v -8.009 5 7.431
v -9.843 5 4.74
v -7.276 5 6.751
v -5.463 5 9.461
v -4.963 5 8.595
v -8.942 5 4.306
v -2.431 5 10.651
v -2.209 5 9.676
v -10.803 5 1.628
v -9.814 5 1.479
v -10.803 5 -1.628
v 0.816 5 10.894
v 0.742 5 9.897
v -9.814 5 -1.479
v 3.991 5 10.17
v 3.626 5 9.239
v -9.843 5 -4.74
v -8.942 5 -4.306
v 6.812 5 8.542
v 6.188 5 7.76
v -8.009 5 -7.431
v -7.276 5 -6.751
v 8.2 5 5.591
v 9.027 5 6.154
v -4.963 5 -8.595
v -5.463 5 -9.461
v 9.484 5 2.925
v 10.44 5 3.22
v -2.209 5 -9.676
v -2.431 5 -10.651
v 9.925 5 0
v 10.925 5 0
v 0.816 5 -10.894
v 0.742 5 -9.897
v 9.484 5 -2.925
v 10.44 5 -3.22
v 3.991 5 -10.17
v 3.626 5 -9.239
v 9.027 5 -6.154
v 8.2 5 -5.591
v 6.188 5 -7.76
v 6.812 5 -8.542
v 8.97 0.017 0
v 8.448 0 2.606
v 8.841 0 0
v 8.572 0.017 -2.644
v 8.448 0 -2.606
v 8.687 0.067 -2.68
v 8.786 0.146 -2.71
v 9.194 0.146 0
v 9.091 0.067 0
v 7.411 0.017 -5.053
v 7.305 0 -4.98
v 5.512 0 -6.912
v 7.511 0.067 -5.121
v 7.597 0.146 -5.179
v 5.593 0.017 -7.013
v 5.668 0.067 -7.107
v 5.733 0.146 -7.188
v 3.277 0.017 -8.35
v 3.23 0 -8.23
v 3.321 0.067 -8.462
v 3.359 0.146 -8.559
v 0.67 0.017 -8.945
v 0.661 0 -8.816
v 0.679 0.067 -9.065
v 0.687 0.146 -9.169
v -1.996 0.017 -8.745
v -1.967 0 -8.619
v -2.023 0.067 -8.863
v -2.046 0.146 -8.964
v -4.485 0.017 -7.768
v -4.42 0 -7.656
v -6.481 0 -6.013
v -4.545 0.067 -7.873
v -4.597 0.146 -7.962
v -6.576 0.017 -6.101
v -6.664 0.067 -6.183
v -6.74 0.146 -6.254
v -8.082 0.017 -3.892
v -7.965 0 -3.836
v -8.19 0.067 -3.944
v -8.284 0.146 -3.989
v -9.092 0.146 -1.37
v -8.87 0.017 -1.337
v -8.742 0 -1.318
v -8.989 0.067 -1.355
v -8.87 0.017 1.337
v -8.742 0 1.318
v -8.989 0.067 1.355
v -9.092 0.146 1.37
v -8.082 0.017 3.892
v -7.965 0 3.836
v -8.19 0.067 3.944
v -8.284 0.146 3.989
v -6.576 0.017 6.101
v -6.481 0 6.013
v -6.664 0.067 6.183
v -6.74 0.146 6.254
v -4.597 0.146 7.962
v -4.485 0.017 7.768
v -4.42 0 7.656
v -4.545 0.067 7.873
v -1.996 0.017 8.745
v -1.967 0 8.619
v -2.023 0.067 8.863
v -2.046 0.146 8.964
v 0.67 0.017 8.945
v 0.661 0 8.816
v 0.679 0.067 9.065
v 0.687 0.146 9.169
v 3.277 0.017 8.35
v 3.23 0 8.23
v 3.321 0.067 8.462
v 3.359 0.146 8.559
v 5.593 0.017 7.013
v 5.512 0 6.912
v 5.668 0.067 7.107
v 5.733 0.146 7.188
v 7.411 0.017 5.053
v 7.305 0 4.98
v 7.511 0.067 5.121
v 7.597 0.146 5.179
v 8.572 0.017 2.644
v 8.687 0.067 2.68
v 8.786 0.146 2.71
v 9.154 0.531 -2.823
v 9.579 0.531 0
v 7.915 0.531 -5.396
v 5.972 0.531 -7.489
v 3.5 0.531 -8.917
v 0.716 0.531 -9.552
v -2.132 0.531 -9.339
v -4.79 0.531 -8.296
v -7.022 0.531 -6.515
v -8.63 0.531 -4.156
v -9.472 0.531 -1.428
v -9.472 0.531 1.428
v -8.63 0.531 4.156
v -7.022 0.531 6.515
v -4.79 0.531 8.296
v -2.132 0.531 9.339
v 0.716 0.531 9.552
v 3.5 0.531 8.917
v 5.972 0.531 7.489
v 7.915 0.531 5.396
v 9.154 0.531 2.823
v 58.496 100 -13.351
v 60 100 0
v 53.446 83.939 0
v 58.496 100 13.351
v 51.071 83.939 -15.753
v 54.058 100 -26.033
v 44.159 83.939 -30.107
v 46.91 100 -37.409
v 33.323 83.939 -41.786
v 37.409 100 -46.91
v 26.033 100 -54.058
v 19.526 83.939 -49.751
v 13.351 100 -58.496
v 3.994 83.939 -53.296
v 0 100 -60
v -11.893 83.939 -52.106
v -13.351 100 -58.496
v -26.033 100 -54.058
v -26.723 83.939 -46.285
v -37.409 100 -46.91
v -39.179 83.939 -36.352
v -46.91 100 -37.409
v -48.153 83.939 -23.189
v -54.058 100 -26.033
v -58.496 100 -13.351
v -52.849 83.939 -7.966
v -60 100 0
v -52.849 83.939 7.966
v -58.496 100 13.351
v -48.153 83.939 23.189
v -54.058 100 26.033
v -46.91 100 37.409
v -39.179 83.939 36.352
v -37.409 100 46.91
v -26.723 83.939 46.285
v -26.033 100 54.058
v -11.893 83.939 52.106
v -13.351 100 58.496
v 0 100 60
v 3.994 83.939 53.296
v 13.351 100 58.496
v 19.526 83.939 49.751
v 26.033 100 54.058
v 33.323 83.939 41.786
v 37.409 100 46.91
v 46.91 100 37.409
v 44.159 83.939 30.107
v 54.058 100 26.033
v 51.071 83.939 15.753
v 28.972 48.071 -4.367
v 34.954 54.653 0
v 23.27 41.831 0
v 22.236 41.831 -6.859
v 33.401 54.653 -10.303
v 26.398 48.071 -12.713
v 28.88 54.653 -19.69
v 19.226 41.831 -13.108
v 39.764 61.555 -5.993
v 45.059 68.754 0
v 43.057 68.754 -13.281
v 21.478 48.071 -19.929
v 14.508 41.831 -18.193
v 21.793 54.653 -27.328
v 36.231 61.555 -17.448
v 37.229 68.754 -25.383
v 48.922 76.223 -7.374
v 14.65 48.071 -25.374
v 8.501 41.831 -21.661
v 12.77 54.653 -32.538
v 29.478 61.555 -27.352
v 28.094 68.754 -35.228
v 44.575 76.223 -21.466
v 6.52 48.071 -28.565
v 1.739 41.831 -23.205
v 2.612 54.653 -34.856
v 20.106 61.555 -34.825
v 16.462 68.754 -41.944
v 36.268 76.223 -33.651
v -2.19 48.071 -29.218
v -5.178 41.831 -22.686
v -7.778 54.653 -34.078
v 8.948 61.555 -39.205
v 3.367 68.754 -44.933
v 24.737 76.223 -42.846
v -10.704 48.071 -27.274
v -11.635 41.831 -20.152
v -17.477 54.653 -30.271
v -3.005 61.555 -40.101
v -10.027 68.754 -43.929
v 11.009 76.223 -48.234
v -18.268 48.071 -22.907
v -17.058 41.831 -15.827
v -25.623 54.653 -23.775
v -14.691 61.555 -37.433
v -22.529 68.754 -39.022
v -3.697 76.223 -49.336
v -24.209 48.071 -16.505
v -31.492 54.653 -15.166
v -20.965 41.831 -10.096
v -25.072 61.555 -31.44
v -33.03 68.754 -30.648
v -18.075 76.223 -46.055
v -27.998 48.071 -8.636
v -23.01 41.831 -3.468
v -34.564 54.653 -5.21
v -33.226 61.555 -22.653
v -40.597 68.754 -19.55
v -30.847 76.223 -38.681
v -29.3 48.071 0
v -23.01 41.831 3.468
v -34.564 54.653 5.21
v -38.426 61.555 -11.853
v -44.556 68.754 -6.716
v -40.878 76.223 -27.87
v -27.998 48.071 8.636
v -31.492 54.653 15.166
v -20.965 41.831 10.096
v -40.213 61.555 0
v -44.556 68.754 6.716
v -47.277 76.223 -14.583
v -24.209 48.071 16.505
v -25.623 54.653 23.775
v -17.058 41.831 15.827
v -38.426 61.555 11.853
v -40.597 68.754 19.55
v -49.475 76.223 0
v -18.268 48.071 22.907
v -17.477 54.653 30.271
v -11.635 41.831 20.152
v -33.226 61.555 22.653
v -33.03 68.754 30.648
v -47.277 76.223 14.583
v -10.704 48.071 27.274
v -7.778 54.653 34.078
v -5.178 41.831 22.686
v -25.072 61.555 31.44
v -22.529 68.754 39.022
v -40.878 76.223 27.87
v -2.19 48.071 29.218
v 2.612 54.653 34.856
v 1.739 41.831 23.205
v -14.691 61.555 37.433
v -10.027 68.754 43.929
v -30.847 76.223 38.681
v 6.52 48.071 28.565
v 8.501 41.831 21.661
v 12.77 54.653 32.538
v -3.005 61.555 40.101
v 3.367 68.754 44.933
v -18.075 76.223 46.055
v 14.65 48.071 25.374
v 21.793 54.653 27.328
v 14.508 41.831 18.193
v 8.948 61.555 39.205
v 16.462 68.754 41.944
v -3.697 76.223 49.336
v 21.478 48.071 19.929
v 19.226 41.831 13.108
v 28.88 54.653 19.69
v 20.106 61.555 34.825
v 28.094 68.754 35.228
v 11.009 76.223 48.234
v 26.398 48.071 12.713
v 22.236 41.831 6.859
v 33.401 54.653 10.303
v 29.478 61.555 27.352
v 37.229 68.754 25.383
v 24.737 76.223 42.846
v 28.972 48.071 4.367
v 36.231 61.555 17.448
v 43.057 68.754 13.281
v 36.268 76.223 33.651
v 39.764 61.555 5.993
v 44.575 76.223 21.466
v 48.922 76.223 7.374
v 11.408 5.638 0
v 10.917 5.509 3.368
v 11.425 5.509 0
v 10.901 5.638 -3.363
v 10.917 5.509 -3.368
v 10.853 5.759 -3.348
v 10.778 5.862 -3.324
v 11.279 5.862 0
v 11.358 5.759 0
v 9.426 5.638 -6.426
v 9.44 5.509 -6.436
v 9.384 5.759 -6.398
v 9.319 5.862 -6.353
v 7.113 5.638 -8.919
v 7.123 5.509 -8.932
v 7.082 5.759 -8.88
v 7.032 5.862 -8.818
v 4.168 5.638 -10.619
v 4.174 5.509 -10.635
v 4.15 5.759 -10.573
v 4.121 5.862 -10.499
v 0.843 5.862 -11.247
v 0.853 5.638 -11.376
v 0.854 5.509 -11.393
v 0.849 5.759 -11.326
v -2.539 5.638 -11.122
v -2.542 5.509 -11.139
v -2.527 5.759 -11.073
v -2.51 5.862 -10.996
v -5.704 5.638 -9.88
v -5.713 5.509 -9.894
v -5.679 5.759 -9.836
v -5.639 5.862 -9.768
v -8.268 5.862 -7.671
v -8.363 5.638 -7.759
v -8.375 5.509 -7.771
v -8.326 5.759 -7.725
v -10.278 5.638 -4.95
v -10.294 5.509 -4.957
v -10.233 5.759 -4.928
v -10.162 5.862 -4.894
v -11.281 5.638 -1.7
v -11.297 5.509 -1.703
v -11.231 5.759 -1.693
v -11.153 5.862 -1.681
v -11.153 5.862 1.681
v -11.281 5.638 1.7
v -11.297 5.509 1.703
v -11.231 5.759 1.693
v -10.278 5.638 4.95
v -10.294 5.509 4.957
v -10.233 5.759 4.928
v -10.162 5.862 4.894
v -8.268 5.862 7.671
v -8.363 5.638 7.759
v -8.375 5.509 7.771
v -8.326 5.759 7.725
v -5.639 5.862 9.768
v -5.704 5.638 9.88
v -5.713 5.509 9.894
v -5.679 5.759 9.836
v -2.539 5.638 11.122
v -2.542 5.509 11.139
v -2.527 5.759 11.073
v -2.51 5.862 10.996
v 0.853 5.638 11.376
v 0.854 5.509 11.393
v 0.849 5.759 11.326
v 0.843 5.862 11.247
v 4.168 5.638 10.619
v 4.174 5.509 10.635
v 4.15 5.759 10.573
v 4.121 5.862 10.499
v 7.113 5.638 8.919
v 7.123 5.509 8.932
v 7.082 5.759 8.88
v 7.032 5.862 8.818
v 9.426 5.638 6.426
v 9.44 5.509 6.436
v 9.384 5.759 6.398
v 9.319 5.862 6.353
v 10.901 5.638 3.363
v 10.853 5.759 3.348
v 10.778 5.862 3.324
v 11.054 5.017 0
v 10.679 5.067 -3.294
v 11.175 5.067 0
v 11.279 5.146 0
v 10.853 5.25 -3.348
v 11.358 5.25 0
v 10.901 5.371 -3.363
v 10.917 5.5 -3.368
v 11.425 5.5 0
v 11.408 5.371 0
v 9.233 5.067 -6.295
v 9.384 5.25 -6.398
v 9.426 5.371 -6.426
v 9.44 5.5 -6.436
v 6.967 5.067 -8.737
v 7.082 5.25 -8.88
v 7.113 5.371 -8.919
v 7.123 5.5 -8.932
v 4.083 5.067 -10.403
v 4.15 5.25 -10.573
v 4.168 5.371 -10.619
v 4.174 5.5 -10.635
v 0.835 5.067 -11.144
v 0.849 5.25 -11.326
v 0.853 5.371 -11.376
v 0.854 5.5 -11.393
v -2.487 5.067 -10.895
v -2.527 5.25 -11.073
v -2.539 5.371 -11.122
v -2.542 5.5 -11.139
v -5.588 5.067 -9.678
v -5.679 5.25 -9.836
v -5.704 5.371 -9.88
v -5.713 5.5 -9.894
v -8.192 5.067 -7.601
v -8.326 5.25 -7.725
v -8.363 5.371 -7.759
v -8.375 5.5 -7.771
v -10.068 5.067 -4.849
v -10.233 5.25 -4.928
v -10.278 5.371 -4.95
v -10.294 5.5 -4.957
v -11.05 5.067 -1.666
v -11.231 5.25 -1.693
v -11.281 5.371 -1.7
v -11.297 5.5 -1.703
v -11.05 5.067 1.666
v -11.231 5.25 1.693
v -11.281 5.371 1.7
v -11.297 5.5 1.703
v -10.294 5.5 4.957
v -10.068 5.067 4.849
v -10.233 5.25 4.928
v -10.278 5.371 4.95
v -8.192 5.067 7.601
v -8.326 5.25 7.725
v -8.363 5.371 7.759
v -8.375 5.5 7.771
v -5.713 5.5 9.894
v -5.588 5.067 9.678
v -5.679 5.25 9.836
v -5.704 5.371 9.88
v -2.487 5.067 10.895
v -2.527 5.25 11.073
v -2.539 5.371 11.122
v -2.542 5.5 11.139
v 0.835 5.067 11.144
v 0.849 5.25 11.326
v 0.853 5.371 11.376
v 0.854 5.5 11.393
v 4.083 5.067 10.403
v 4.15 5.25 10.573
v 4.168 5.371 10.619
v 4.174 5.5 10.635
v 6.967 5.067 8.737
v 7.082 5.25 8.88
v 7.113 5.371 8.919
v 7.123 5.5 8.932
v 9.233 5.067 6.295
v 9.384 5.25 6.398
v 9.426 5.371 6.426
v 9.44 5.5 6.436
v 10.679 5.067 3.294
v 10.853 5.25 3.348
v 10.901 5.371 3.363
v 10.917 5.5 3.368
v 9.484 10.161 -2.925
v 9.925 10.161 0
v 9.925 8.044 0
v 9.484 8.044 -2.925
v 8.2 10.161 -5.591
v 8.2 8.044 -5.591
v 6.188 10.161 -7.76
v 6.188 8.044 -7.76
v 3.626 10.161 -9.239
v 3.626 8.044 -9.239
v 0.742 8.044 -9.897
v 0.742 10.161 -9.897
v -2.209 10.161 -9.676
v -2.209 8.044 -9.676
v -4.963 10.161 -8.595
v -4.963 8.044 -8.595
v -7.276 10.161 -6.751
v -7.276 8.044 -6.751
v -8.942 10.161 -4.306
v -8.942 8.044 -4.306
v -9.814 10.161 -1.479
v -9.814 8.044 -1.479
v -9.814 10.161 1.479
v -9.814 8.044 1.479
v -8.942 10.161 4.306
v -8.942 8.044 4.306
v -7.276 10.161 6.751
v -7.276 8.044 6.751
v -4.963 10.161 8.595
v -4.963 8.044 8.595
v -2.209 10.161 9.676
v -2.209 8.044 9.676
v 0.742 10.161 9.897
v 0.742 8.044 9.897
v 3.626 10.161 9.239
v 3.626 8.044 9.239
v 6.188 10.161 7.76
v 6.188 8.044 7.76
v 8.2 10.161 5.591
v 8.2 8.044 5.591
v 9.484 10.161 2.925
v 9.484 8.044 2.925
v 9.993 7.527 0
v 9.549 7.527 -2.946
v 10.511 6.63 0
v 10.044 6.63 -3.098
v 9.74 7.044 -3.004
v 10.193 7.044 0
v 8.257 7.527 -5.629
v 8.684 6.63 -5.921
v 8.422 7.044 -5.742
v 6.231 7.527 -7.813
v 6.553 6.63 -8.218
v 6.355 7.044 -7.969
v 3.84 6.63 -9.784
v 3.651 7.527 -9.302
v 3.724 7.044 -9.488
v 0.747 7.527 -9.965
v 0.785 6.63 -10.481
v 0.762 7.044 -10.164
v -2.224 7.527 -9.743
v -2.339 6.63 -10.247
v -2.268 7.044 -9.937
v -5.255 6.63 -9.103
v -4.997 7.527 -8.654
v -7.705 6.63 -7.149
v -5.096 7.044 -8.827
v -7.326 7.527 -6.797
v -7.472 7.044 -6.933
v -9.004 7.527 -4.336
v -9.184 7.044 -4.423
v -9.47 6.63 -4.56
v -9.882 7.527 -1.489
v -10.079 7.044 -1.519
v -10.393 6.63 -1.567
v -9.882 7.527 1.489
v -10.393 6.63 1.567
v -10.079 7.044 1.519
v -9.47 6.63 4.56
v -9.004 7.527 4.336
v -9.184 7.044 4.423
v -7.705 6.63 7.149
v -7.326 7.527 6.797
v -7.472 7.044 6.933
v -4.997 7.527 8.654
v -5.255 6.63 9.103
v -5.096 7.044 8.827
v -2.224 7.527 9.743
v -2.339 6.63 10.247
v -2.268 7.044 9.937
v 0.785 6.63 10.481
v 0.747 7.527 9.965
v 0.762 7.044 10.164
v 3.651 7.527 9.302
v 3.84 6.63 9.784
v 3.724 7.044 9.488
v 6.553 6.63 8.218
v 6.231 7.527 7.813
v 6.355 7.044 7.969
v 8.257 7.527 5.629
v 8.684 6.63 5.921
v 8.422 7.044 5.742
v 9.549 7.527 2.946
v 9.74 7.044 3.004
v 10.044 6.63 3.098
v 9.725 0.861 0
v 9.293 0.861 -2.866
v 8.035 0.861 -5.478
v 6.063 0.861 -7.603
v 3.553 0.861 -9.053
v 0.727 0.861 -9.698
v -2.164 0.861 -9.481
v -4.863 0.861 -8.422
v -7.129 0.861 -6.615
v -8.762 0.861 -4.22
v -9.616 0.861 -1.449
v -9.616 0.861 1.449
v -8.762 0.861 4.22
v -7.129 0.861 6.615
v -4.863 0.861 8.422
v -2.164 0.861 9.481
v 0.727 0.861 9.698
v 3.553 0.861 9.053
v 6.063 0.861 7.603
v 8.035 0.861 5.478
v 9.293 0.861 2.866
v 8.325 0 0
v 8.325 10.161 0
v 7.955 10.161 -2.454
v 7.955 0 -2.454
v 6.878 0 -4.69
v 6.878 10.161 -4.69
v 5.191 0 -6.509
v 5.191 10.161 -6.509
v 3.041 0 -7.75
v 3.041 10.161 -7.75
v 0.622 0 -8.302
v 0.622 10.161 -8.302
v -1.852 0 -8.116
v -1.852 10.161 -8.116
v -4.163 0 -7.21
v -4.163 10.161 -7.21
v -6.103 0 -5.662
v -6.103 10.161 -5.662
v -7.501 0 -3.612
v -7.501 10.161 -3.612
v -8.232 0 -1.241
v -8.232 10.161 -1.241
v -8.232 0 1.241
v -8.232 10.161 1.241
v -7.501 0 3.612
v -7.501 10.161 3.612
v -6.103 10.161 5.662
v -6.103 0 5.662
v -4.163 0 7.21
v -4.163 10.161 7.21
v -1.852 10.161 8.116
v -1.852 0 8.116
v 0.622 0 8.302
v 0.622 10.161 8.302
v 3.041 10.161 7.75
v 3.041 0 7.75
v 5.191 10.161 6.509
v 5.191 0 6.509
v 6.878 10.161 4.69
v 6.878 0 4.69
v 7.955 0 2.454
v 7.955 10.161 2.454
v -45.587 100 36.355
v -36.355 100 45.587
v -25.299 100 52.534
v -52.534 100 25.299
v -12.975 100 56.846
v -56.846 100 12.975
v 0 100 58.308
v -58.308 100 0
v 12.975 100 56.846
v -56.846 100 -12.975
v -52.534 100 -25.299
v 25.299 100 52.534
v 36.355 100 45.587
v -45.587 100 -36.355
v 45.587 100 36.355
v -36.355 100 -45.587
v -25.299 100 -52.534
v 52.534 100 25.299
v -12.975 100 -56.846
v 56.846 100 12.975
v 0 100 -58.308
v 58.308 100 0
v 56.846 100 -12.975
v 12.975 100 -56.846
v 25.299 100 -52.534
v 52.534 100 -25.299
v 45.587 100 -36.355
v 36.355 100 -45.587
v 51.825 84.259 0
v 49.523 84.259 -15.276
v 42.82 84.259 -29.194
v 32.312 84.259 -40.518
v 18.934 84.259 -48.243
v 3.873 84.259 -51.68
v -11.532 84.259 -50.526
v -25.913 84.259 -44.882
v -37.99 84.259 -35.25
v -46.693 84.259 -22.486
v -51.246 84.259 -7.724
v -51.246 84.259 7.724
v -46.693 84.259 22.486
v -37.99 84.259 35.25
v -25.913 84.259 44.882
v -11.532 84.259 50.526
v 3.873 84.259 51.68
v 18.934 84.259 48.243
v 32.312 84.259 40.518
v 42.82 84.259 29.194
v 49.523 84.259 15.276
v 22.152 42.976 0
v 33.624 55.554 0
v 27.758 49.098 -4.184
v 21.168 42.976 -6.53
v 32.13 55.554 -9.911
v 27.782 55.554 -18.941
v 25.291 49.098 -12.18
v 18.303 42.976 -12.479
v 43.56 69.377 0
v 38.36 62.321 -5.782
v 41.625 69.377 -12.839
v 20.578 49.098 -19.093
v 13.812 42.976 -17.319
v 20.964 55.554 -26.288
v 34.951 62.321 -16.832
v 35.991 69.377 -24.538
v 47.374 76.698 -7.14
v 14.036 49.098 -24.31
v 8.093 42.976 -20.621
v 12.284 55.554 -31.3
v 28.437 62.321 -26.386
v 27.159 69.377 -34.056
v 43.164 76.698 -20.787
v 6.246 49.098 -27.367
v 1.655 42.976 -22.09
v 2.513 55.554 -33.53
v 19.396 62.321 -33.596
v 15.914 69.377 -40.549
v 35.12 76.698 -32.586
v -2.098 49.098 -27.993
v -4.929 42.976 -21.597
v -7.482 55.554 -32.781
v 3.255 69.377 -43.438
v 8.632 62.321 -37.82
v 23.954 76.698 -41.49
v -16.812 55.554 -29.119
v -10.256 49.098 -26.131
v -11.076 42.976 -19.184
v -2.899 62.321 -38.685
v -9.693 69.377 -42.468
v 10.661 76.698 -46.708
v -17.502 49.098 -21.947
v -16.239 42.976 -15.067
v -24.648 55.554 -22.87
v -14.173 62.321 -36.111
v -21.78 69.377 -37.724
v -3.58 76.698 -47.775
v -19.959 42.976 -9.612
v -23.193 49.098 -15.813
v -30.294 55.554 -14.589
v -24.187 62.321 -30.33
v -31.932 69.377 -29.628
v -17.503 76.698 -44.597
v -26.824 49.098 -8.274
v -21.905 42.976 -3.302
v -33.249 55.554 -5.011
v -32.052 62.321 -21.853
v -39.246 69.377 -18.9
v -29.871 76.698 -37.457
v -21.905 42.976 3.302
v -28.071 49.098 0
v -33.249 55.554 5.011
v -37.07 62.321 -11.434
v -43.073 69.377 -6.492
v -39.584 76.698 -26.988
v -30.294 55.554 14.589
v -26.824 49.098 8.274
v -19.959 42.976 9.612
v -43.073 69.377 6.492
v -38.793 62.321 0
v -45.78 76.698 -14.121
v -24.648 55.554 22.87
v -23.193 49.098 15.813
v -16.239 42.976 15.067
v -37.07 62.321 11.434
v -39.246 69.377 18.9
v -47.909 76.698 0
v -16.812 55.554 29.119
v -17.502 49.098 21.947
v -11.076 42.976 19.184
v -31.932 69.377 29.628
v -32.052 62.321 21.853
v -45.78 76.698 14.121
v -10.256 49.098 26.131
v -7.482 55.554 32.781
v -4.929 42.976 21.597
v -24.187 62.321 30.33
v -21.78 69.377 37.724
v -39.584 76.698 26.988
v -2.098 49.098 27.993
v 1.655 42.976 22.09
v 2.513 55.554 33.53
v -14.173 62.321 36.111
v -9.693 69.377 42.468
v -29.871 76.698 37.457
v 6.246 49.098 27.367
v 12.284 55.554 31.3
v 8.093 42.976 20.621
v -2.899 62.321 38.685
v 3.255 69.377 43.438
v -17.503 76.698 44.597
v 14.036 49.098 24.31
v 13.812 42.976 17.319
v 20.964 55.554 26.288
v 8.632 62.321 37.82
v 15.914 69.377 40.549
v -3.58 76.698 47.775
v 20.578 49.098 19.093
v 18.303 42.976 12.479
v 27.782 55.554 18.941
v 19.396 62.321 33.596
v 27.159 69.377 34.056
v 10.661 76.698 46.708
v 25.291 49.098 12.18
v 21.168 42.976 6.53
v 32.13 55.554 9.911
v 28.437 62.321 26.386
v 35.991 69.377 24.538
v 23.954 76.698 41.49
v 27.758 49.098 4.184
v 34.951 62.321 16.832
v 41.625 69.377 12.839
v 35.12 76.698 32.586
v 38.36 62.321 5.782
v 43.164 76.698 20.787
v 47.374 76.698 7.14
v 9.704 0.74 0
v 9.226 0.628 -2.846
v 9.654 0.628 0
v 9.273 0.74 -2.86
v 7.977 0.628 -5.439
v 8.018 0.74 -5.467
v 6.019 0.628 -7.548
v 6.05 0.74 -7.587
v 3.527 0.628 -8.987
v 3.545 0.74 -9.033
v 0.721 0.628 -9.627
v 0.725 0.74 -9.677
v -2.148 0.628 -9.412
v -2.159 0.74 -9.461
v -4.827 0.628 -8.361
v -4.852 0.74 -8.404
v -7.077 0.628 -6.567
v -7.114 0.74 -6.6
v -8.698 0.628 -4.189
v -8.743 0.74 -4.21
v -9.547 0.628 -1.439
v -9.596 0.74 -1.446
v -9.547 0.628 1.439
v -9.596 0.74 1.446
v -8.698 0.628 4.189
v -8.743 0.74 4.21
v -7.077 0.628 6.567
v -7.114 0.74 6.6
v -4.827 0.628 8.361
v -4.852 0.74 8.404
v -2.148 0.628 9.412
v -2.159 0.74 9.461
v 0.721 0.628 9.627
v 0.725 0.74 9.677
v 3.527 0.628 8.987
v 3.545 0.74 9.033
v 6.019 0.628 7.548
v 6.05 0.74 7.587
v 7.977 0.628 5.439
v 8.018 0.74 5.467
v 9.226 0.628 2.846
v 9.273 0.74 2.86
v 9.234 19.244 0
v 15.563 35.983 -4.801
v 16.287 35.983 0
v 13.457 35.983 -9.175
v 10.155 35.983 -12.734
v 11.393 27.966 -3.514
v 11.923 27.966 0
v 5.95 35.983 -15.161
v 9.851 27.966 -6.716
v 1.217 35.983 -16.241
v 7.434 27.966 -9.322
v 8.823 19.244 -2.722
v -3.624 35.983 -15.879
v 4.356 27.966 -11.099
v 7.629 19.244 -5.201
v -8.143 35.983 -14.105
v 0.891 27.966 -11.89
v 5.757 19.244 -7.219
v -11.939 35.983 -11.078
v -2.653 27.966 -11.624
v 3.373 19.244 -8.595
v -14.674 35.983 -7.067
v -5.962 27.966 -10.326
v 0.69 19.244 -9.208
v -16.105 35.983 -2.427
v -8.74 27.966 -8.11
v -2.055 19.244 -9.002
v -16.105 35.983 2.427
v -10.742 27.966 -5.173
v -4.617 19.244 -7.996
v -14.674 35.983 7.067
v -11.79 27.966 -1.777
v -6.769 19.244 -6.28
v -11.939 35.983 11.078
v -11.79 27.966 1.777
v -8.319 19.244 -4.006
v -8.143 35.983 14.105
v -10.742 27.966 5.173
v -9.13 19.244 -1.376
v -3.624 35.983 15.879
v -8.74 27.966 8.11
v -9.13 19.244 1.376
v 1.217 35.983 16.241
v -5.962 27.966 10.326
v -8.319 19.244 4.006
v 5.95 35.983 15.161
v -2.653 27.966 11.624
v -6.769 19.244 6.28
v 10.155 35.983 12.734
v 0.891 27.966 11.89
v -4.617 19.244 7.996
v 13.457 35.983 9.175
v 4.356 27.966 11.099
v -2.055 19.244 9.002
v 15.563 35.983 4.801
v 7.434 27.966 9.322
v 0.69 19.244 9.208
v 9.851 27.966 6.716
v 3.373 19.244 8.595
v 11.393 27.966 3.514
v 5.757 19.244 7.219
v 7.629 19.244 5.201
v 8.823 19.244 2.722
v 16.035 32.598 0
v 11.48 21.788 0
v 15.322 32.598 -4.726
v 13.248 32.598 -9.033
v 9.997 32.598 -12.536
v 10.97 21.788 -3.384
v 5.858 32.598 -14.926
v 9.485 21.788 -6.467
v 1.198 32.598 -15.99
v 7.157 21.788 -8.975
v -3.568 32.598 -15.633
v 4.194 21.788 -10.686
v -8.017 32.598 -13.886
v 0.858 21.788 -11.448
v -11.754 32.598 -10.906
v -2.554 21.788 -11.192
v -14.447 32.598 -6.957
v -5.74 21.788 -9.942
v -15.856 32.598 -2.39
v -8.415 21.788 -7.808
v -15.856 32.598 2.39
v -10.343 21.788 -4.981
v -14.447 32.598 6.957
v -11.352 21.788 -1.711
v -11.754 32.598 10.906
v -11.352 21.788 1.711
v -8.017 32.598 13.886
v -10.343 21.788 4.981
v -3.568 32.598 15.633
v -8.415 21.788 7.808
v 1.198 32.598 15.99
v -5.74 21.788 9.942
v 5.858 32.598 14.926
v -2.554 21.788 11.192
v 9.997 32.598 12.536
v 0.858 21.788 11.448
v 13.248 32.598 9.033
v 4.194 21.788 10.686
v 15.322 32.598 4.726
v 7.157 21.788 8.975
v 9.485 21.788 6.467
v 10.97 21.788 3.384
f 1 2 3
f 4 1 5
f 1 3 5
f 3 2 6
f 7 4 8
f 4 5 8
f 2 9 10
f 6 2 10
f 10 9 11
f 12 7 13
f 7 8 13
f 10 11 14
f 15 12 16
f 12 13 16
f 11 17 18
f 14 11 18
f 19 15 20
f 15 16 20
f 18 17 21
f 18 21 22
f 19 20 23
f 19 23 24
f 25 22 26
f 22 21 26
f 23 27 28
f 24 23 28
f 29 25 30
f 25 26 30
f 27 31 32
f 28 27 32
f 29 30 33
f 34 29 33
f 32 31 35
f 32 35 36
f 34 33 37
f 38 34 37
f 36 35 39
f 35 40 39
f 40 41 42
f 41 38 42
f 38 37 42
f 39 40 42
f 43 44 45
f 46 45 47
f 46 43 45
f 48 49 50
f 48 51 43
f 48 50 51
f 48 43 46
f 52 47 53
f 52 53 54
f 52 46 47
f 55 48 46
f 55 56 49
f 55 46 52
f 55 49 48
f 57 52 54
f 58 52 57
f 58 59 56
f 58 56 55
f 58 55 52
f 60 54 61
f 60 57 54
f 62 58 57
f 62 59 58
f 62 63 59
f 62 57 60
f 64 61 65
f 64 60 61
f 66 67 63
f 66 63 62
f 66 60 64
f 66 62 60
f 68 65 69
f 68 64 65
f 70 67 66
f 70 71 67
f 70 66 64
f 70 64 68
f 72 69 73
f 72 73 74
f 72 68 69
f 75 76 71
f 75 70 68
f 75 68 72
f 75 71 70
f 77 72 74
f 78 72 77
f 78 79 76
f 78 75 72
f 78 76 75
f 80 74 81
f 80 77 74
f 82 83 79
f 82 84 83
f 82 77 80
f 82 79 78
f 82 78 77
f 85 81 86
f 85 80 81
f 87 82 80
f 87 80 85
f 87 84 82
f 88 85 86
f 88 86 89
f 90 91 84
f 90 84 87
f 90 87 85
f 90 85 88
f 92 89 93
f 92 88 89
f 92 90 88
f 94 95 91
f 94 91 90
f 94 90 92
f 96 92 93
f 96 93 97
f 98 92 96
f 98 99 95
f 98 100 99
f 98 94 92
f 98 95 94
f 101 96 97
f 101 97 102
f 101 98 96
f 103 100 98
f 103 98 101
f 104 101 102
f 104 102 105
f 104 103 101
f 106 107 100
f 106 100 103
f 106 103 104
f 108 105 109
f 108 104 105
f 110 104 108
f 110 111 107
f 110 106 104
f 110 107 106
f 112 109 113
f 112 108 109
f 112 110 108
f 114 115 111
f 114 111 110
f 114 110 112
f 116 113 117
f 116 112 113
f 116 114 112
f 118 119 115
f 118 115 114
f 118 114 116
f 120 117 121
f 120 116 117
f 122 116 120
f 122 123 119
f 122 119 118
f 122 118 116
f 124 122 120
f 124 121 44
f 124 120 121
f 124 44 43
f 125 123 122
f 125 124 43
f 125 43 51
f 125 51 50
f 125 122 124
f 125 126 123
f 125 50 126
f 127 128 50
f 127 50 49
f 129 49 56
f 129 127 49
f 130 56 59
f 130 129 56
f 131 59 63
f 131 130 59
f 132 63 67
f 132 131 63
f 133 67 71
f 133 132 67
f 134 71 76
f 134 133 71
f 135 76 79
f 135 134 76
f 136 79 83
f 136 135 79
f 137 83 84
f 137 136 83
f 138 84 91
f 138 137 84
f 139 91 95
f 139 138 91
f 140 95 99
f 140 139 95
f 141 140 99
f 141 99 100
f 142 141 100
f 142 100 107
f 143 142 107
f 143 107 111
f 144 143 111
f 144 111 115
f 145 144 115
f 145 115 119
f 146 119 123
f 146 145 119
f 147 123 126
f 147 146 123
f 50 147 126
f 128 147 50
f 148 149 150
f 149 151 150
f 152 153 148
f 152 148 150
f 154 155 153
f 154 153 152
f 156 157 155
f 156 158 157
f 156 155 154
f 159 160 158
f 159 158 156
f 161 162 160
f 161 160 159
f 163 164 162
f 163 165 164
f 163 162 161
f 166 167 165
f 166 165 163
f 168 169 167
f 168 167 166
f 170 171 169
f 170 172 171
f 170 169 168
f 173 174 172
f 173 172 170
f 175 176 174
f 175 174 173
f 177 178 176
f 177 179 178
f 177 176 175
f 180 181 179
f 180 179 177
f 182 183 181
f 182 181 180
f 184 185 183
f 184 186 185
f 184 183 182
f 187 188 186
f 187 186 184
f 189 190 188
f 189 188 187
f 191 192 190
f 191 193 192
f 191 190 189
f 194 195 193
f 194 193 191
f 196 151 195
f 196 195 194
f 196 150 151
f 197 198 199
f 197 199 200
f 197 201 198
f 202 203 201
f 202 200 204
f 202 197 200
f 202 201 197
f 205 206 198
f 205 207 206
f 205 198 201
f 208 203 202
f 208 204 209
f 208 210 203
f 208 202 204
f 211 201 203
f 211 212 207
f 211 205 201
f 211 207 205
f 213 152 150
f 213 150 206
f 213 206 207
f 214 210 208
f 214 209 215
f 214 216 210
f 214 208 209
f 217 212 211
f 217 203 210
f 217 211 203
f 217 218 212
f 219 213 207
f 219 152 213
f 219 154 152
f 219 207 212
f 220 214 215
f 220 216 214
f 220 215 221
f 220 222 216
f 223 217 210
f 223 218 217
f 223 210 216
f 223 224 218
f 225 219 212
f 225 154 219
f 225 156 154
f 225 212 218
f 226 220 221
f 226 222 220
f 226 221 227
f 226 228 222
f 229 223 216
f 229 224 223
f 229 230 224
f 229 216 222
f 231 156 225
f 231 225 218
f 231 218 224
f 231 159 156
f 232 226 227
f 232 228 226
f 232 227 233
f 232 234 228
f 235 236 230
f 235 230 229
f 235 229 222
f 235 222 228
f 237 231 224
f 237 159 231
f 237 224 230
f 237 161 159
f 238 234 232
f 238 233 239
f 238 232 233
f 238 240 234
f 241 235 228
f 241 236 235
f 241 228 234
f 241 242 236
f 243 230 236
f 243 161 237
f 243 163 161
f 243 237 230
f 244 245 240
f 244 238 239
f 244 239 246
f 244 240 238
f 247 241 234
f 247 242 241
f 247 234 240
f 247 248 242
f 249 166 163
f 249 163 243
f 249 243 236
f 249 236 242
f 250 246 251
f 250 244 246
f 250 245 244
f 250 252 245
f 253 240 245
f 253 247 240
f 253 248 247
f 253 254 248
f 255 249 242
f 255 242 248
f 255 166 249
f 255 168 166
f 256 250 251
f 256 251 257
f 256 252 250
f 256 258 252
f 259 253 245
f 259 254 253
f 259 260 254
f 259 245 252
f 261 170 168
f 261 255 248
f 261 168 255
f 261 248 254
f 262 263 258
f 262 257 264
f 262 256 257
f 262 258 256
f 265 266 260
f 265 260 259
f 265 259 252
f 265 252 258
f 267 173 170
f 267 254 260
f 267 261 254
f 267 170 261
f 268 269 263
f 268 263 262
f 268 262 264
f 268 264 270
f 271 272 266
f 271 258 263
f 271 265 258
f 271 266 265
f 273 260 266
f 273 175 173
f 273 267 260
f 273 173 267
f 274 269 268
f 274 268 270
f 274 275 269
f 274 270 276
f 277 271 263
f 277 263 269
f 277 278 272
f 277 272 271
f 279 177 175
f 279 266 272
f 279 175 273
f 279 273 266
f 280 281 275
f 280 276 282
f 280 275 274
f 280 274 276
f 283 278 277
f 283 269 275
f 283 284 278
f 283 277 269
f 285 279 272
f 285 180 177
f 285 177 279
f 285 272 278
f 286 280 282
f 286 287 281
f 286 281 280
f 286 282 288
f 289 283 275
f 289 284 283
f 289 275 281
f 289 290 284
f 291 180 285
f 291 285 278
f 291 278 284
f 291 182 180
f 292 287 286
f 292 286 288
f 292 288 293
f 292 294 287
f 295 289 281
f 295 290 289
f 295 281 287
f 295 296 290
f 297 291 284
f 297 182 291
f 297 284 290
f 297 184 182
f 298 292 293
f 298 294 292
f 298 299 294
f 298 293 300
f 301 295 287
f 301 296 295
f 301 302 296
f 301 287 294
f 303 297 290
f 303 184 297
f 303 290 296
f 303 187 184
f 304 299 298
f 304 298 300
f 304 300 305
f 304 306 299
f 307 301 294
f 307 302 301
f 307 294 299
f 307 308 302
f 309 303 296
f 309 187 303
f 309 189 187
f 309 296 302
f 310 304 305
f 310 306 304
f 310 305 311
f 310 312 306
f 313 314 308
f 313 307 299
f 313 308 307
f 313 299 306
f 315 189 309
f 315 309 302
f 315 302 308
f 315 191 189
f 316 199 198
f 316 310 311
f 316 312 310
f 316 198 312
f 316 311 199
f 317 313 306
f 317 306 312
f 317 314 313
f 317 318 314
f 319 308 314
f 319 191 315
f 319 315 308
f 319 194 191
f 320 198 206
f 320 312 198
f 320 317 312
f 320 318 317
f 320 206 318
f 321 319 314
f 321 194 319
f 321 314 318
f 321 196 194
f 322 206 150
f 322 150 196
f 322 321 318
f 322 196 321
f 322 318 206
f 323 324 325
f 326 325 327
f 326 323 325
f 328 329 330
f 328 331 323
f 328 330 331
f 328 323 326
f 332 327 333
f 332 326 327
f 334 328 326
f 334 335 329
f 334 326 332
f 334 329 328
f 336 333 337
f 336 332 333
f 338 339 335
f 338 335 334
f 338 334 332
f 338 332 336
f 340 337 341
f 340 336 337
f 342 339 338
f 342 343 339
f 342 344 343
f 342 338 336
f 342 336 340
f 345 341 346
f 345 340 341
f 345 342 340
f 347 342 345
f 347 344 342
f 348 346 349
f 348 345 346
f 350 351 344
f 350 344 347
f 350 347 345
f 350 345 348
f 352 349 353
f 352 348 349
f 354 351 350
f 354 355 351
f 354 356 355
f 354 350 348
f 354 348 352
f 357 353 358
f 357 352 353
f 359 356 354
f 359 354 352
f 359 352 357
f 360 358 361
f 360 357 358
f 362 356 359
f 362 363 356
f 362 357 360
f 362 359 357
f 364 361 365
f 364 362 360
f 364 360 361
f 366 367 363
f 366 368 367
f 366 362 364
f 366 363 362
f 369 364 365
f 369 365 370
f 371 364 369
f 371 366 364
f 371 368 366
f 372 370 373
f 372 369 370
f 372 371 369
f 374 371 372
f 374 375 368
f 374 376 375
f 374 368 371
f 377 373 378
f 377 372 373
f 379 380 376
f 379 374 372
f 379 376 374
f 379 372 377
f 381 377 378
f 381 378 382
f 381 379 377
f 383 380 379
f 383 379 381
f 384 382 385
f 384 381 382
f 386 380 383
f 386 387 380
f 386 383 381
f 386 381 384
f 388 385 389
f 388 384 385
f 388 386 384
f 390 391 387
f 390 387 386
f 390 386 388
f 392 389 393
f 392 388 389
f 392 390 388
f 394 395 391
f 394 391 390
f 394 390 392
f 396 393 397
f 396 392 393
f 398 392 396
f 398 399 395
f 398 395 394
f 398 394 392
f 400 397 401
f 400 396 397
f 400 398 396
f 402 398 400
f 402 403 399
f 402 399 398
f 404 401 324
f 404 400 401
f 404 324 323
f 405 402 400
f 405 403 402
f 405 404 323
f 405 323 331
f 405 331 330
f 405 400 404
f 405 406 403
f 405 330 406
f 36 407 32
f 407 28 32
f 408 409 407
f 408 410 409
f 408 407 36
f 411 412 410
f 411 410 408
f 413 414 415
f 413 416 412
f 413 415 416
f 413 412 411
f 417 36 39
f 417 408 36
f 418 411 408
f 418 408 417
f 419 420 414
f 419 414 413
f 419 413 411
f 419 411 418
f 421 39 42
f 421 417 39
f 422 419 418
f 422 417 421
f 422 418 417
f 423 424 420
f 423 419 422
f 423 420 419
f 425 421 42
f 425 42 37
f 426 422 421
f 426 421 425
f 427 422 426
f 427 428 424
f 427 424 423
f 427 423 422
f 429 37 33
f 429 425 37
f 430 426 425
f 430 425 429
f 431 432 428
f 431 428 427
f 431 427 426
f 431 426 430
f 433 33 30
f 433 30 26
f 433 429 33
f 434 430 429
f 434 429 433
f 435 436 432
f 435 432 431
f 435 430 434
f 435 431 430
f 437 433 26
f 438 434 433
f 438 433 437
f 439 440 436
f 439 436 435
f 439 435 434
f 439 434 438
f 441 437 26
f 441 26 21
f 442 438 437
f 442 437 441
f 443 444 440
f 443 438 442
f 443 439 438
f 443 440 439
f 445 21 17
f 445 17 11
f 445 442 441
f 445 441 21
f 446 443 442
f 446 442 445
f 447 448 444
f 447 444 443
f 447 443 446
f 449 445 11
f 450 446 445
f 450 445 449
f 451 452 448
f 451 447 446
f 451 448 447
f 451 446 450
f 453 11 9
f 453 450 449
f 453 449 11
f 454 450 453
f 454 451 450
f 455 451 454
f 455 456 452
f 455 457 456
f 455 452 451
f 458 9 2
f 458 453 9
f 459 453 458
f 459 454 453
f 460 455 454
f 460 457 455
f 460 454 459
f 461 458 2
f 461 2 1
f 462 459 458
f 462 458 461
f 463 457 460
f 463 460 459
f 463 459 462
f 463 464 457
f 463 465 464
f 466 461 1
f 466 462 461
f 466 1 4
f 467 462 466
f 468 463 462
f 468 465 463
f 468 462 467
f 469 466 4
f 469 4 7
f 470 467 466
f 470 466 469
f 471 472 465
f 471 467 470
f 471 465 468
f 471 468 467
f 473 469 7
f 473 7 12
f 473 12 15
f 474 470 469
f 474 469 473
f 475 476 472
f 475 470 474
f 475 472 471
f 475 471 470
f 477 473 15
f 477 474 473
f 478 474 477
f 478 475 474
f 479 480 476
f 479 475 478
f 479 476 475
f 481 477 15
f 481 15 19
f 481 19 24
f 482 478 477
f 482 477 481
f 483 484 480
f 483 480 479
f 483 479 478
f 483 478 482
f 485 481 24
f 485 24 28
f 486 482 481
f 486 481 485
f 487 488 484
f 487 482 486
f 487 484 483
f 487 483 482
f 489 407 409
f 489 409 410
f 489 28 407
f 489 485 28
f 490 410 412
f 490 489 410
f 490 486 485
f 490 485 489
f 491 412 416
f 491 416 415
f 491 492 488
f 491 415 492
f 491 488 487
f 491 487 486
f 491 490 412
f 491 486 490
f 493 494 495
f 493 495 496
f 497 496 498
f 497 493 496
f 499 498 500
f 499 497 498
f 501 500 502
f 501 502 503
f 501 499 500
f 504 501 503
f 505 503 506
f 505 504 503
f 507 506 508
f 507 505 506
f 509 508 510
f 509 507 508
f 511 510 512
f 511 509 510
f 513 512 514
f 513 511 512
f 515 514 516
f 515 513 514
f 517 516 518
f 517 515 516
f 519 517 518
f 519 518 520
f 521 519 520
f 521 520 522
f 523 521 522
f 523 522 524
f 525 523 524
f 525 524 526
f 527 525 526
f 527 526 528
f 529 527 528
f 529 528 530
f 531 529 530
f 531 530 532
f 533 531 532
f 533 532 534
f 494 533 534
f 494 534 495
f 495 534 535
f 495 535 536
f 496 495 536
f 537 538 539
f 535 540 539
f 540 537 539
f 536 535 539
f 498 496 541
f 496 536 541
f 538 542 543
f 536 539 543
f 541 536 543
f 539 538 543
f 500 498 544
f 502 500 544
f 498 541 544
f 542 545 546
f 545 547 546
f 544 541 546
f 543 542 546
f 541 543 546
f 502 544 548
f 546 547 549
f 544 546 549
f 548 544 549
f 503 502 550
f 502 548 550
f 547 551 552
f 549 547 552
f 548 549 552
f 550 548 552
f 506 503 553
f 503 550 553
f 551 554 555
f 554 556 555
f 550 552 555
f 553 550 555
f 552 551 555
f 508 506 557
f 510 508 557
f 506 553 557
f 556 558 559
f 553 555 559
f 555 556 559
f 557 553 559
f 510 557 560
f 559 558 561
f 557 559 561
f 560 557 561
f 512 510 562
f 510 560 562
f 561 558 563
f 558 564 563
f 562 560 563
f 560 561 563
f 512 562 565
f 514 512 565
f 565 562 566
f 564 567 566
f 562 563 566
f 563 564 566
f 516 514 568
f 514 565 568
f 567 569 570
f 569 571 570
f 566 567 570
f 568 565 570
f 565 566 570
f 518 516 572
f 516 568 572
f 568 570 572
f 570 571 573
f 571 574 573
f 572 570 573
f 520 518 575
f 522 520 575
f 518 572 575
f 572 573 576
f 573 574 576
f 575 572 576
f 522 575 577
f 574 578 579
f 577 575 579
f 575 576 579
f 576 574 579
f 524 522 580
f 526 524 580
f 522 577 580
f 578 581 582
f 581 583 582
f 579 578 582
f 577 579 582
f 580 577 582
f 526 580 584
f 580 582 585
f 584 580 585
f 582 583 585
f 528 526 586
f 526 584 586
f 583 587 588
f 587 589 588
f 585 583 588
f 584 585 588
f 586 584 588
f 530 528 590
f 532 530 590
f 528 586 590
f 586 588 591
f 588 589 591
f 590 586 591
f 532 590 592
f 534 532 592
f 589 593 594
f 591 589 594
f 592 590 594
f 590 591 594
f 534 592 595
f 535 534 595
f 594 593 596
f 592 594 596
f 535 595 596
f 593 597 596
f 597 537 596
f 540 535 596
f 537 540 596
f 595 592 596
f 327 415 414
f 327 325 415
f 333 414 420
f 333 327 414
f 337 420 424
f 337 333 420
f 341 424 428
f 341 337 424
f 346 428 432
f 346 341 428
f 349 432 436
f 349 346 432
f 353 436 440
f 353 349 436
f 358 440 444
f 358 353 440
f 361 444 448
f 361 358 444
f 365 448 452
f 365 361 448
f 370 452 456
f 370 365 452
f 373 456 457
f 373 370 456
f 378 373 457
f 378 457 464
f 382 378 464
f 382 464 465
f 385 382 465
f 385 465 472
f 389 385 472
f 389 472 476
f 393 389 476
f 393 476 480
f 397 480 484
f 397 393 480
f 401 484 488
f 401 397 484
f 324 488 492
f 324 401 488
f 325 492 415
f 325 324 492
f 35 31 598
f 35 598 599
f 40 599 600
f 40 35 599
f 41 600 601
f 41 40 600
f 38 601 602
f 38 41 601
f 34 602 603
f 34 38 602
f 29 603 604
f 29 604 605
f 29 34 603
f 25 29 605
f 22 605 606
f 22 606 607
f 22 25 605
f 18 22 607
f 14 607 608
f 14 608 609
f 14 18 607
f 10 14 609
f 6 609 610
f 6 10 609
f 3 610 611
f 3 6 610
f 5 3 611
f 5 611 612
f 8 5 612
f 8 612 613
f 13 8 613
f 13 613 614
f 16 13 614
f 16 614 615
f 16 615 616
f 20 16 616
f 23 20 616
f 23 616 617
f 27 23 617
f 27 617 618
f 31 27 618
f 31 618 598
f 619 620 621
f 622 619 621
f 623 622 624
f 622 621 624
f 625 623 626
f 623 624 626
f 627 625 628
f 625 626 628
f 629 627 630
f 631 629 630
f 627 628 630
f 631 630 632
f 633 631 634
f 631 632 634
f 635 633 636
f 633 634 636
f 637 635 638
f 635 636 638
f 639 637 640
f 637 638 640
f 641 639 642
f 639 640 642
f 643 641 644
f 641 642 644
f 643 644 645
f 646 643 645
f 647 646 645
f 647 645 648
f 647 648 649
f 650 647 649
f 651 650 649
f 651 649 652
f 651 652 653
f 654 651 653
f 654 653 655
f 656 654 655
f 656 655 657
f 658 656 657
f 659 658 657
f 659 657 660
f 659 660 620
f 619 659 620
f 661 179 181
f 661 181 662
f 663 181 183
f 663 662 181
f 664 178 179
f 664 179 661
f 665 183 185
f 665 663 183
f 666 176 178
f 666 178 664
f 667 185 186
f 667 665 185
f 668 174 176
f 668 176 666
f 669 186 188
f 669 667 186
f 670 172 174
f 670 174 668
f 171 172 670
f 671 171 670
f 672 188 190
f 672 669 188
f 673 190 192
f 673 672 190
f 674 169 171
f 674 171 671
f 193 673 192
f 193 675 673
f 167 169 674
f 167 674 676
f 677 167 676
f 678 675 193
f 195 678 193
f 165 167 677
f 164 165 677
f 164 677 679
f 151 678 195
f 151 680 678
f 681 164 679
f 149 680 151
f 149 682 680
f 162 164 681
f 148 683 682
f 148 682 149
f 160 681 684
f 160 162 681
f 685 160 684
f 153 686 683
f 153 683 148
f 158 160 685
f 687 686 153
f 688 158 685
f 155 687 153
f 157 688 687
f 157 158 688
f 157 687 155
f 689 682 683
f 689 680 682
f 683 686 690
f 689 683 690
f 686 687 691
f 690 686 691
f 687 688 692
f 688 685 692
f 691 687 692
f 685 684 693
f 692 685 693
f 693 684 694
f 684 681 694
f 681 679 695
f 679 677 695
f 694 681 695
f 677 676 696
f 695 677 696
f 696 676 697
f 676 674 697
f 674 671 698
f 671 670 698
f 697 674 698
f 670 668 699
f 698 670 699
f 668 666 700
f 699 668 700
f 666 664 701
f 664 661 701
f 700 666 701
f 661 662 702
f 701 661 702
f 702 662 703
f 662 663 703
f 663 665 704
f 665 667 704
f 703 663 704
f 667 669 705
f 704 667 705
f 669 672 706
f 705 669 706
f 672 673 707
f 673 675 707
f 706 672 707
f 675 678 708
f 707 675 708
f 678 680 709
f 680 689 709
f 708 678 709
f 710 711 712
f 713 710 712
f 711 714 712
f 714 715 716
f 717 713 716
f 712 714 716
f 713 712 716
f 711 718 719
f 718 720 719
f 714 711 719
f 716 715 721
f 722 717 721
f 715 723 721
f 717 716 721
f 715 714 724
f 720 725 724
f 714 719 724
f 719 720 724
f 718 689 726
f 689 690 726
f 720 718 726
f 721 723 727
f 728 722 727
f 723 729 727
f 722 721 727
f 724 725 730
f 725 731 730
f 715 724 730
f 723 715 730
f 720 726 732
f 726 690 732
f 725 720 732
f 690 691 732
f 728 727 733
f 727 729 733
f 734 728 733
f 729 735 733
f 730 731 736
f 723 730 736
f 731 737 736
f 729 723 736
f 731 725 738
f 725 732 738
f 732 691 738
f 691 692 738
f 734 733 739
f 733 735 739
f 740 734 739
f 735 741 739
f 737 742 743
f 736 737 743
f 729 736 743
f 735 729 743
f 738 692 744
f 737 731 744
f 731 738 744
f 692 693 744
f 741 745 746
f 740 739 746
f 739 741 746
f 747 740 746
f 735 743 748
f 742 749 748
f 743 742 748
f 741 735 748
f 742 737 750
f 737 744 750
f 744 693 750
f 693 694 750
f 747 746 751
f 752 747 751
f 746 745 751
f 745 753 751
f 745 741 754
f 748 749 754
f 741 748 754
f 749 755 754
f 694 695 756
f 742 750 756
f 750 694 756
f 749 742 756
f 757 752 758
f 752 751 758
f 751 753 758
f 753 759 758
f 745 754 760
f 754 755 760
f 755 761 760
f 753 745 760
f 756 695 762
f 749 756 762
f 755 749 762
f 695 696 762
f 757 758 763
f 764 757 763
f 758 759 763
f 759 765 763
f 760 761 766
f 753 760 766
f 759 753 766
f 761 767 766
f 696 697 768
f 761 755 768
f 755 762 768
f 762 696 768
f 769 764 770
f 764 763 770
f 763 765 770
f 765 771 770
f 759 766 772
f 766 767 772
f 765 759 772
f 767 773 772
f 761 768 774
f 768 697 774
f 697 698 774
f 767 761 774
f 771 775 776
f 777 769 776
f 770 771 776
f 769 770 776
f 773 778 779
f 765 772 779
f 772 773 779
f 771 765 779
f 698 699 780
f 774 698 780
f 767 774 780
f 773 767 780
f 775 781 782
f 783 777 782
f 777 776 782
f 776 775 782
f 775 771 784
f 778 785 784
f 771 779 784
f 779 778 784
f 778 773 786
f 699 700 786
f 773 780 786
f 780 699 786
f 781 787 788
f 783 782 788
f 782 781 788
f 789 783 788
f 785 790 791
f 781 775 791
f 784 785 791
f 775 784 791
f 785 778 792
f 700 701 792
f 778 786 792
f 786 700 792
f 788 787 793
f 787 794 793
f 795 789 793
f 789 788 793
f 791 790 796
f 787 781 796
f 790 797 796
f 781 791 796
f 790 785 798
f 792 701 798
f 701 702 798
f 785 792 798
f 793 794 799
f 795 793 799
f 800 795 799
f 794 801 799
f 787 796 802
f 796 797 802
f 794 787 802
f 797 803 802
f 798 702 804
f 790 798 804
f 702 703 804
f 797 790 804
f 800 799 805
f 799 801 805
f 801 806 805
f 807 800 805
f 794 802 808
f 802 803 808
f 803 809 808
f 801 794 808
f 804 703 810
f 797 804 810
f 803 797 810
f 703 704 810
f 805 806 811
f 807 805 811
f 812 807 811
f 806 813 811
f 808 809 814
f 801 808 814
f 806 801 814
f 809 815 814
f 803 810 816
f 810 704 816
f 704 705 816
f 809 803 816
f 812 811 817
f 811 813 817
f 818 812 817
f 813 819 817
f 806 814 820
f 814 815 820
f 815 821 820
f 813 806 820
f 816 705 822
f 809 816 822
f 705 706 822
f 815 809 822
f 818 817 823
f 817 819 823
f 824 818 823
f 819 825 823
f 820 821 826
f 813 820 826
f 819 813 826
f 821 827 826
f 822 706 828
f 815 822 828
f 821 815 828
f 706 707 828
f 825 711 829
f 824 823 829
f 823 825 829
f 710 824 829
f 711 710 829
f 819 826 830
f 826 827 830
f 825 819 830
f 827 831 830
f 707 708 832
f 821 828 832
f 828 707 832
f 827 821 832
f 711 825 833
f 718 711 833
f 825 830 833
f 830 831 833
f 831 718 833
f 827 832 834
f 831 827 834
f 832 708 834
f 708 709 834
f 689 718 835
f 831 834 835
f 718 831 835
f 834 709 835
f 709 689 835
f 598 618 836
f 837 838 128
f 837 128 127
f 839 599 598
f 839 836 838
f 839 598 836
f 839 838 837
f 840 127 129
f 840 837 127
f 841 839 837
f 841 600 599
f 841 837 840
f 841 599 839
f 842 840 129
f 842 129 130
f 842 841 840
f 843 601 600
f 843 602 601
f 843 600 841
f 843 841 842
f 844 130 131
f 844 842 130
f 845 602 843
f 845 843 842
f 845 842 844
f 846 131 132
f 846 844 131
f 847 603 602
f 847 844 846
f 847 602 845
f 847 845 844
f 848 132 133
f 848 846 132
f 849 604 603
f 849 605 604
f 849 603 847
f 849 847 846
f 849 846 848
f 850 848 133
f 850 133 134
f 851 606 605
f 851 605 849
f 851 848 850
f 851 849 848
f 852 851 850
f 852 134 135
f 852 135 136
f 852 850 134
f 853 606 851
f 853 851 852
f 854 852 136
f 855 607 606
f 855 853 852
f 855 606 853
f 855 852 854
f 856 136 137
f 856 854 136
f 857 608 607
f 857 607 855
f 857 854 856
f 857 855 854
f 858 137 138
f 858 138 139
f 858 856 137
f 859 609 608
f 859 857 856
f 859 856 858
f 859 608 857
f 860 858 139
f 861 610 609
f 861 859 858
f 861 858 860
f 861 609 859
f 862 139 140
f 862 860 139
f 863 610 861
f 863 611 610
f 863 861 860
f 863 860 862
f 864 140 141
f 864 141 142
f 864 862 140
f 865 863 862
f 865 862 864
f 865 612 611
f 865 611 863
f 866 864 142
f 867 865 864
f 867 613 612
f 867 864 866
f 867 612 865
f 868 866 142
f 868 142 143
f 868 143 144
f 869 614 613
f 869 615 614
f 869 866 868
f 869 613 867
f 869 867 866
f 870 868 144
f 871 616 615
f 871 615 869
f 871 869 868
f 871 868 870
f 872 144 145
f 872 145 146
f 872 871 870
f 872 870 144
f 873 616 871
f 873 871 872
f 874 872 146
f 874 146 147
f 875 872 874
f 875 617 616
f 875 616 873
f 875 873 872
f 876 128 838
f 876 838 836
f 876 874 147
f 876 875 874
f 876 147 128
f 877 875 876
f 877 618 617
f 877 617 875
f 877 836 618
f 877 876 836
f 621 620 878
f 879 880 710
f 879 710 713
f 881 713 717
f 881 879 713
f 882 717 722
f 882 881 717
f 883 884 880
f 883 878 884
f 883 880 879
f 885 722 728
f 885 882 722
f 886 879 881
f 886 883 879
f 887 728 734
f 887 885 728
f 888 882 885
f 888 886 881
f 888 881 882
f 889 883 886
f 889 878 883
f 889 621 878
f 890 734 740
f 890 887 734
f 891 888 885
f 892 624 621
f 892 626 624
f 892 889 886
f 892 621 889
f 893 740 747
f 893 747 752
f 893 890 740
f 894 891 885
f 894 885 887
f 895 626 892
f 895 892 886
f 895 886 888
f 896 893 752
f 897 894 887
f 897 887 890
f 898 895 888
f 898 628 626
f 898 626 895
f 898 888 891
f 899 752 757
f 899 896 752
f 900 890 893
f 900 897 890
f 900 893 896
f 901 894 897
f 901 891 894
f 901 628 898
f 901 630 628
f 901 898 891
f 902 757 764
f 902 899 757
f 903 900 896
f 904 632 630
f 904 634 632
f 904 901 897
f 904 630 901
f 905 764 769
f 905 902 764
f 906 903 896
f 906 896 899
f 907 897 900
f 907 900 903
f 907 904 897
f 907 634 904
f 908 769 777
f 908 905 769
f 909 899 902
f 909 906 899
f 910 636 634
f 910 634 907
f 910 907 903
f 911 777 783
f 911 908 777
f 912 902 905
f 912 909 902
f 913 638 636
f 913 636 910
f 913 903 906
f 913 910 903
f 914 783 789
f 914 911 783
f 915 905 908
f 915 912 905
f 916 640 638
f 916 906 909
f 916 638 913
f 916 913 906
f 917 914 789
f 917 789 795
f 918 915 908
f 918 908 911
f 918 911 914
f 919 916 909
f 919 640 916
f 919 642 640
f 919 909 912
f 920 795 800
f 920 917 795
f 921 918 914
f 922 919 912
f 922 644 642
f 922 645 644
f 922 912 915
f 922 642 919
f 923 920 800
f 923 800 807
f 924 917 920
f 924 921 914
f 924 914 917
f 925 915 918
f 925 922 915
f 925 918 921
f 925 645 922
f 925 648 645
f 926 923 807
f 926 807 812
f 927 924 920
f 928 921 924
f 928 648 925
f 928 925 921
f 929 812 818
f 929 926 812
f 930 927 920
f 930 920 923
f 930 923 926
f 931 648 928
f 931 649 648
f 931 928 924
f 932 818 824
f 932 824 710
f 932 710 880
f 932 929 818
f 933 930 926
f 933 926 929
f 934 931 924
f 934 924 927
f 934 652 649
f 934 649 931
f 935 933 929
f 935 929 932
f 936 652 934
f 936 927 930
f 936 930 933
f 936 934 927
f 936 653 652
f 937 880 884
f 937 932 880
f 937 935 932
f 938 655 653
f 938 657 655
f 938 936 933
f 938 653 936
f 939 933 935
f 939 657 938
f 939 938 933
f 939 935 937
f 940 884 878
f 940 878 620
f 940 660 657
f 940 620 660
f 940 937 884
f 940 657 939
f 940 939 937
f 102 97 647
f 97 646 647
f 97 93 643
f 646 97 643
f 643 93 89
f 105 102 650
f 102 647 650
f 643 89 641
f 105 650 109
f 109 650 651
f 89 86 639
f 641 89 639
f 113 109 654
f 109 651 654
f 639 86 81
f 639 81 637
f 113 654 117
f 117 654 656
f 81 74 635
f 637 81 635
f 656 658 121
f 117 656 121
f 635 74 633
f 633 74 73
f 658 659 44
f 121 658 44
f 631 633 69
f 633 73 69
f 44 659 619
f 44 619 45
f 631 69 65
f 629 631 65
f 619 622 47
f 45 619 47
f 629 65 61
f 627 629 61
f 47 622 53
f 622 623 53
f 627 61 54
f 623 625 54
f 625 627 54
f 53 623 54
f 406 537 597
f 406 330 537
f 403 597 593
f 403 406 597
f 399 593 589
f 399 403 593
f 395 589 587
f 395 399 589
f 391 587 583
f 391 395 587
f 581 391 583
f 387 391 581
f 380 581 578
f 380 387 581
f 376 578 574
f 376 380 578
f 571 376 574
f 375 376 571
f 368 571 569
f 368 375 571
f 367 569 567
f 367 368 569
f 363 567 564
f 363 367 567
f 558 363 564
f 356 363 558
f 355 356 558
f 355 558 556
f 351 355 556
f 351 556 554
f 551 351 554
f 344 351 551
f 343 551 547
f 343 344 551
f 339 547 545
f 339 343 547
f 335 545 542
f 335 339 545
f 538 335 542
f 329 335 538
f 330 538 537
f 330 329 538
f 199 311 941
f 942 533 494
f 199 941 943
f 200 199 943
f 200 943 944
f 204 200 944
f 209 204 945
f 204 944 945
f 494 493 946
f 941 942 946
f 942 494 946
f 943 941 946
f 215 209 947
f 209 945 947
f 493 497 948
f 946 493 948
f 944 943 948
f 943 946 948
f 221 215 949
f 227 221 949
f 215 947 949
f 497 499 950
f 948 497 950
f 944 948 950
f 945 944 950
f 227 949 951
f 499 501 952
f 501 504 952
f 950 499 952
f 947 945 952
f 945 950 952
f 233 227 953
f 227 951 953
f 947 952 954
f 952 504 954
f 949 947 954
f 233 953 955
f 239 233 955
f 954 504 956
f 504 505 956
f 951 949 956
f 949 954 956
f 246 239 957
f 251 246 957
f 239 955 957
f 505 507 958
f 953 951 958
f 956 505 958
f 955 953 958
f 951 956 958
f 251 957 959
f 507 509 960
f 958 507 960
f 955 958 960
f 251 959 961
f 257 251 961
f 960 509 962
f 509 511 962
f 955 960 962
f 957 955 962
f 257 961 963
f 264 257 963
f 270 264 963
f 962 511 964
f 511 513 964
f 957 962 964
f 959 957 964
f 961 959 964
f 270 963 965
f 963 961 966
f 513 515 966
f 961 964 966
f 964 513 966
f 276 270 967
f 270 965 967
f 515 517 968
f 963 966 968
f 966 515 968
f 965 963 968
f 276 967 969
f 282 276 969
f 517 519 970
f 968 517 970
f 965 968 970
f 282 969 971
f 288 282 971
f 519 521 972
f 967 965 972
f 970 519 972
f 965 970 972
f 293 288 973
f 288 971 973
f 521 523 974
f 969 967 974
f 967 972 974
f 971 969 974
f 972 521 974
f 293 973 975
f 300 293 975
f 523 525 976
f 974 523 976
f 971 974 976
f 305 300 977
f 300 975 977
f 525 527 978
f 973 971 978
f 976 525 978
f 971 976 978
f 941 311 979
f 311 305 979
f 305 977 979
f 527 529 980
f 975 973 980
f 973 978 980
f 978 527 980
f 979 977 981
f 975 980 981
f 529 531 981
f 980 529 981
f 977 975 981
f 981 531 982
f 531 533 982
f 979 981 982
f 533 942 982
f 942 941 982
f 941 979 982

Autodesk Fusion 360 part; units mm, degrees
sketch "Sketch1" plane through (0, 0, 0) normal (0, 0, 1) x (1, 0, 0)
  line L0 (9.925, 8.0443) -> (9.925, 10.1613)
  arc A0 (23.2698, 41.8312) -> (9.925, 10.1613) centre (54.177, 10.1613) ccw
  arc A1 (23.2698, 41.8312) -> (60, 100) centre (-80.1817, 147.8356) ccw
  line L1 (23.2698, 41.8312) -> (0, 19.1218) construction
  line L2 (0, 0) -> (0, 100)
  line L3 (8.325, 0) -> (8.325, 10.1613)
  arc A2 (22.1523, 42.9762) -> (8.325, 10.1613) centre (54.177, 10.1613) ccw
  arc A3 (22.1523, 42.9762) -> (58.3083, 100) centre (-80.1817, 147.8356) ccw
  line L4 (8.325, 0) -> (8.8407, 0)
  line L5 (60, 100) -> (58.3083, 100)
  line L6 (9.1943, 0.1464) -> (9.5791, 0.5313)
  line L7 (9.925, 5) -> (10.925, 5)
  line L8 (11.425, 5.5) -> (11.425, 5.5087)
  line L9 (11.2786, 5.8623) -> (10.5108, 6.6301)
  arc A4 (9.925, 8.0443) -> (10.5108, 6.6301) centre (11.925, 8.0443) ccw
  line L10 (9.925, 5) -> (9.725, 0.8607)
  arc A5 (11.425, 5.5087) -> (11.2786, 5.8623) centre (10.925, 5.5087) ccw
  arc A6 (10.925, 5) -> (11.425, 5.5) centre (10.925, 5.5) ccw
  arc A7 (8.8407, 0) -> (9.1943, 0.1464) centre (8.8407, 0.5) ccw
  arc A8 (9.5791, 0.5313) -> (9.725, 0.8607) centre (9.2256, 0.8849) ccw
  point P0 (11.425, 5)
  dimension "d1" = 100
  dimension "d2" = 120
  dimension "d3" = 45.698
  dimension "d4" = 19.85
  dimension "d7" = 45
  dimension "d8" = 1.5
  dimension "d9" = 5
  dimension "d10" = 3.1
  dimension "d11" = 2
  dimension "d12" = 45
  dimension "d13" = 0.5
  dimension "d14" = 0.5
  dimension "d15" = 0.5
  dimension "d17" = 0.2
revolve "Revolve1" add sketch "Sketch1" angle 360 about axis through (0, 0, 0) along (0, 1, 0)
equation "d4 = 20 mm - 0.15 mm"
